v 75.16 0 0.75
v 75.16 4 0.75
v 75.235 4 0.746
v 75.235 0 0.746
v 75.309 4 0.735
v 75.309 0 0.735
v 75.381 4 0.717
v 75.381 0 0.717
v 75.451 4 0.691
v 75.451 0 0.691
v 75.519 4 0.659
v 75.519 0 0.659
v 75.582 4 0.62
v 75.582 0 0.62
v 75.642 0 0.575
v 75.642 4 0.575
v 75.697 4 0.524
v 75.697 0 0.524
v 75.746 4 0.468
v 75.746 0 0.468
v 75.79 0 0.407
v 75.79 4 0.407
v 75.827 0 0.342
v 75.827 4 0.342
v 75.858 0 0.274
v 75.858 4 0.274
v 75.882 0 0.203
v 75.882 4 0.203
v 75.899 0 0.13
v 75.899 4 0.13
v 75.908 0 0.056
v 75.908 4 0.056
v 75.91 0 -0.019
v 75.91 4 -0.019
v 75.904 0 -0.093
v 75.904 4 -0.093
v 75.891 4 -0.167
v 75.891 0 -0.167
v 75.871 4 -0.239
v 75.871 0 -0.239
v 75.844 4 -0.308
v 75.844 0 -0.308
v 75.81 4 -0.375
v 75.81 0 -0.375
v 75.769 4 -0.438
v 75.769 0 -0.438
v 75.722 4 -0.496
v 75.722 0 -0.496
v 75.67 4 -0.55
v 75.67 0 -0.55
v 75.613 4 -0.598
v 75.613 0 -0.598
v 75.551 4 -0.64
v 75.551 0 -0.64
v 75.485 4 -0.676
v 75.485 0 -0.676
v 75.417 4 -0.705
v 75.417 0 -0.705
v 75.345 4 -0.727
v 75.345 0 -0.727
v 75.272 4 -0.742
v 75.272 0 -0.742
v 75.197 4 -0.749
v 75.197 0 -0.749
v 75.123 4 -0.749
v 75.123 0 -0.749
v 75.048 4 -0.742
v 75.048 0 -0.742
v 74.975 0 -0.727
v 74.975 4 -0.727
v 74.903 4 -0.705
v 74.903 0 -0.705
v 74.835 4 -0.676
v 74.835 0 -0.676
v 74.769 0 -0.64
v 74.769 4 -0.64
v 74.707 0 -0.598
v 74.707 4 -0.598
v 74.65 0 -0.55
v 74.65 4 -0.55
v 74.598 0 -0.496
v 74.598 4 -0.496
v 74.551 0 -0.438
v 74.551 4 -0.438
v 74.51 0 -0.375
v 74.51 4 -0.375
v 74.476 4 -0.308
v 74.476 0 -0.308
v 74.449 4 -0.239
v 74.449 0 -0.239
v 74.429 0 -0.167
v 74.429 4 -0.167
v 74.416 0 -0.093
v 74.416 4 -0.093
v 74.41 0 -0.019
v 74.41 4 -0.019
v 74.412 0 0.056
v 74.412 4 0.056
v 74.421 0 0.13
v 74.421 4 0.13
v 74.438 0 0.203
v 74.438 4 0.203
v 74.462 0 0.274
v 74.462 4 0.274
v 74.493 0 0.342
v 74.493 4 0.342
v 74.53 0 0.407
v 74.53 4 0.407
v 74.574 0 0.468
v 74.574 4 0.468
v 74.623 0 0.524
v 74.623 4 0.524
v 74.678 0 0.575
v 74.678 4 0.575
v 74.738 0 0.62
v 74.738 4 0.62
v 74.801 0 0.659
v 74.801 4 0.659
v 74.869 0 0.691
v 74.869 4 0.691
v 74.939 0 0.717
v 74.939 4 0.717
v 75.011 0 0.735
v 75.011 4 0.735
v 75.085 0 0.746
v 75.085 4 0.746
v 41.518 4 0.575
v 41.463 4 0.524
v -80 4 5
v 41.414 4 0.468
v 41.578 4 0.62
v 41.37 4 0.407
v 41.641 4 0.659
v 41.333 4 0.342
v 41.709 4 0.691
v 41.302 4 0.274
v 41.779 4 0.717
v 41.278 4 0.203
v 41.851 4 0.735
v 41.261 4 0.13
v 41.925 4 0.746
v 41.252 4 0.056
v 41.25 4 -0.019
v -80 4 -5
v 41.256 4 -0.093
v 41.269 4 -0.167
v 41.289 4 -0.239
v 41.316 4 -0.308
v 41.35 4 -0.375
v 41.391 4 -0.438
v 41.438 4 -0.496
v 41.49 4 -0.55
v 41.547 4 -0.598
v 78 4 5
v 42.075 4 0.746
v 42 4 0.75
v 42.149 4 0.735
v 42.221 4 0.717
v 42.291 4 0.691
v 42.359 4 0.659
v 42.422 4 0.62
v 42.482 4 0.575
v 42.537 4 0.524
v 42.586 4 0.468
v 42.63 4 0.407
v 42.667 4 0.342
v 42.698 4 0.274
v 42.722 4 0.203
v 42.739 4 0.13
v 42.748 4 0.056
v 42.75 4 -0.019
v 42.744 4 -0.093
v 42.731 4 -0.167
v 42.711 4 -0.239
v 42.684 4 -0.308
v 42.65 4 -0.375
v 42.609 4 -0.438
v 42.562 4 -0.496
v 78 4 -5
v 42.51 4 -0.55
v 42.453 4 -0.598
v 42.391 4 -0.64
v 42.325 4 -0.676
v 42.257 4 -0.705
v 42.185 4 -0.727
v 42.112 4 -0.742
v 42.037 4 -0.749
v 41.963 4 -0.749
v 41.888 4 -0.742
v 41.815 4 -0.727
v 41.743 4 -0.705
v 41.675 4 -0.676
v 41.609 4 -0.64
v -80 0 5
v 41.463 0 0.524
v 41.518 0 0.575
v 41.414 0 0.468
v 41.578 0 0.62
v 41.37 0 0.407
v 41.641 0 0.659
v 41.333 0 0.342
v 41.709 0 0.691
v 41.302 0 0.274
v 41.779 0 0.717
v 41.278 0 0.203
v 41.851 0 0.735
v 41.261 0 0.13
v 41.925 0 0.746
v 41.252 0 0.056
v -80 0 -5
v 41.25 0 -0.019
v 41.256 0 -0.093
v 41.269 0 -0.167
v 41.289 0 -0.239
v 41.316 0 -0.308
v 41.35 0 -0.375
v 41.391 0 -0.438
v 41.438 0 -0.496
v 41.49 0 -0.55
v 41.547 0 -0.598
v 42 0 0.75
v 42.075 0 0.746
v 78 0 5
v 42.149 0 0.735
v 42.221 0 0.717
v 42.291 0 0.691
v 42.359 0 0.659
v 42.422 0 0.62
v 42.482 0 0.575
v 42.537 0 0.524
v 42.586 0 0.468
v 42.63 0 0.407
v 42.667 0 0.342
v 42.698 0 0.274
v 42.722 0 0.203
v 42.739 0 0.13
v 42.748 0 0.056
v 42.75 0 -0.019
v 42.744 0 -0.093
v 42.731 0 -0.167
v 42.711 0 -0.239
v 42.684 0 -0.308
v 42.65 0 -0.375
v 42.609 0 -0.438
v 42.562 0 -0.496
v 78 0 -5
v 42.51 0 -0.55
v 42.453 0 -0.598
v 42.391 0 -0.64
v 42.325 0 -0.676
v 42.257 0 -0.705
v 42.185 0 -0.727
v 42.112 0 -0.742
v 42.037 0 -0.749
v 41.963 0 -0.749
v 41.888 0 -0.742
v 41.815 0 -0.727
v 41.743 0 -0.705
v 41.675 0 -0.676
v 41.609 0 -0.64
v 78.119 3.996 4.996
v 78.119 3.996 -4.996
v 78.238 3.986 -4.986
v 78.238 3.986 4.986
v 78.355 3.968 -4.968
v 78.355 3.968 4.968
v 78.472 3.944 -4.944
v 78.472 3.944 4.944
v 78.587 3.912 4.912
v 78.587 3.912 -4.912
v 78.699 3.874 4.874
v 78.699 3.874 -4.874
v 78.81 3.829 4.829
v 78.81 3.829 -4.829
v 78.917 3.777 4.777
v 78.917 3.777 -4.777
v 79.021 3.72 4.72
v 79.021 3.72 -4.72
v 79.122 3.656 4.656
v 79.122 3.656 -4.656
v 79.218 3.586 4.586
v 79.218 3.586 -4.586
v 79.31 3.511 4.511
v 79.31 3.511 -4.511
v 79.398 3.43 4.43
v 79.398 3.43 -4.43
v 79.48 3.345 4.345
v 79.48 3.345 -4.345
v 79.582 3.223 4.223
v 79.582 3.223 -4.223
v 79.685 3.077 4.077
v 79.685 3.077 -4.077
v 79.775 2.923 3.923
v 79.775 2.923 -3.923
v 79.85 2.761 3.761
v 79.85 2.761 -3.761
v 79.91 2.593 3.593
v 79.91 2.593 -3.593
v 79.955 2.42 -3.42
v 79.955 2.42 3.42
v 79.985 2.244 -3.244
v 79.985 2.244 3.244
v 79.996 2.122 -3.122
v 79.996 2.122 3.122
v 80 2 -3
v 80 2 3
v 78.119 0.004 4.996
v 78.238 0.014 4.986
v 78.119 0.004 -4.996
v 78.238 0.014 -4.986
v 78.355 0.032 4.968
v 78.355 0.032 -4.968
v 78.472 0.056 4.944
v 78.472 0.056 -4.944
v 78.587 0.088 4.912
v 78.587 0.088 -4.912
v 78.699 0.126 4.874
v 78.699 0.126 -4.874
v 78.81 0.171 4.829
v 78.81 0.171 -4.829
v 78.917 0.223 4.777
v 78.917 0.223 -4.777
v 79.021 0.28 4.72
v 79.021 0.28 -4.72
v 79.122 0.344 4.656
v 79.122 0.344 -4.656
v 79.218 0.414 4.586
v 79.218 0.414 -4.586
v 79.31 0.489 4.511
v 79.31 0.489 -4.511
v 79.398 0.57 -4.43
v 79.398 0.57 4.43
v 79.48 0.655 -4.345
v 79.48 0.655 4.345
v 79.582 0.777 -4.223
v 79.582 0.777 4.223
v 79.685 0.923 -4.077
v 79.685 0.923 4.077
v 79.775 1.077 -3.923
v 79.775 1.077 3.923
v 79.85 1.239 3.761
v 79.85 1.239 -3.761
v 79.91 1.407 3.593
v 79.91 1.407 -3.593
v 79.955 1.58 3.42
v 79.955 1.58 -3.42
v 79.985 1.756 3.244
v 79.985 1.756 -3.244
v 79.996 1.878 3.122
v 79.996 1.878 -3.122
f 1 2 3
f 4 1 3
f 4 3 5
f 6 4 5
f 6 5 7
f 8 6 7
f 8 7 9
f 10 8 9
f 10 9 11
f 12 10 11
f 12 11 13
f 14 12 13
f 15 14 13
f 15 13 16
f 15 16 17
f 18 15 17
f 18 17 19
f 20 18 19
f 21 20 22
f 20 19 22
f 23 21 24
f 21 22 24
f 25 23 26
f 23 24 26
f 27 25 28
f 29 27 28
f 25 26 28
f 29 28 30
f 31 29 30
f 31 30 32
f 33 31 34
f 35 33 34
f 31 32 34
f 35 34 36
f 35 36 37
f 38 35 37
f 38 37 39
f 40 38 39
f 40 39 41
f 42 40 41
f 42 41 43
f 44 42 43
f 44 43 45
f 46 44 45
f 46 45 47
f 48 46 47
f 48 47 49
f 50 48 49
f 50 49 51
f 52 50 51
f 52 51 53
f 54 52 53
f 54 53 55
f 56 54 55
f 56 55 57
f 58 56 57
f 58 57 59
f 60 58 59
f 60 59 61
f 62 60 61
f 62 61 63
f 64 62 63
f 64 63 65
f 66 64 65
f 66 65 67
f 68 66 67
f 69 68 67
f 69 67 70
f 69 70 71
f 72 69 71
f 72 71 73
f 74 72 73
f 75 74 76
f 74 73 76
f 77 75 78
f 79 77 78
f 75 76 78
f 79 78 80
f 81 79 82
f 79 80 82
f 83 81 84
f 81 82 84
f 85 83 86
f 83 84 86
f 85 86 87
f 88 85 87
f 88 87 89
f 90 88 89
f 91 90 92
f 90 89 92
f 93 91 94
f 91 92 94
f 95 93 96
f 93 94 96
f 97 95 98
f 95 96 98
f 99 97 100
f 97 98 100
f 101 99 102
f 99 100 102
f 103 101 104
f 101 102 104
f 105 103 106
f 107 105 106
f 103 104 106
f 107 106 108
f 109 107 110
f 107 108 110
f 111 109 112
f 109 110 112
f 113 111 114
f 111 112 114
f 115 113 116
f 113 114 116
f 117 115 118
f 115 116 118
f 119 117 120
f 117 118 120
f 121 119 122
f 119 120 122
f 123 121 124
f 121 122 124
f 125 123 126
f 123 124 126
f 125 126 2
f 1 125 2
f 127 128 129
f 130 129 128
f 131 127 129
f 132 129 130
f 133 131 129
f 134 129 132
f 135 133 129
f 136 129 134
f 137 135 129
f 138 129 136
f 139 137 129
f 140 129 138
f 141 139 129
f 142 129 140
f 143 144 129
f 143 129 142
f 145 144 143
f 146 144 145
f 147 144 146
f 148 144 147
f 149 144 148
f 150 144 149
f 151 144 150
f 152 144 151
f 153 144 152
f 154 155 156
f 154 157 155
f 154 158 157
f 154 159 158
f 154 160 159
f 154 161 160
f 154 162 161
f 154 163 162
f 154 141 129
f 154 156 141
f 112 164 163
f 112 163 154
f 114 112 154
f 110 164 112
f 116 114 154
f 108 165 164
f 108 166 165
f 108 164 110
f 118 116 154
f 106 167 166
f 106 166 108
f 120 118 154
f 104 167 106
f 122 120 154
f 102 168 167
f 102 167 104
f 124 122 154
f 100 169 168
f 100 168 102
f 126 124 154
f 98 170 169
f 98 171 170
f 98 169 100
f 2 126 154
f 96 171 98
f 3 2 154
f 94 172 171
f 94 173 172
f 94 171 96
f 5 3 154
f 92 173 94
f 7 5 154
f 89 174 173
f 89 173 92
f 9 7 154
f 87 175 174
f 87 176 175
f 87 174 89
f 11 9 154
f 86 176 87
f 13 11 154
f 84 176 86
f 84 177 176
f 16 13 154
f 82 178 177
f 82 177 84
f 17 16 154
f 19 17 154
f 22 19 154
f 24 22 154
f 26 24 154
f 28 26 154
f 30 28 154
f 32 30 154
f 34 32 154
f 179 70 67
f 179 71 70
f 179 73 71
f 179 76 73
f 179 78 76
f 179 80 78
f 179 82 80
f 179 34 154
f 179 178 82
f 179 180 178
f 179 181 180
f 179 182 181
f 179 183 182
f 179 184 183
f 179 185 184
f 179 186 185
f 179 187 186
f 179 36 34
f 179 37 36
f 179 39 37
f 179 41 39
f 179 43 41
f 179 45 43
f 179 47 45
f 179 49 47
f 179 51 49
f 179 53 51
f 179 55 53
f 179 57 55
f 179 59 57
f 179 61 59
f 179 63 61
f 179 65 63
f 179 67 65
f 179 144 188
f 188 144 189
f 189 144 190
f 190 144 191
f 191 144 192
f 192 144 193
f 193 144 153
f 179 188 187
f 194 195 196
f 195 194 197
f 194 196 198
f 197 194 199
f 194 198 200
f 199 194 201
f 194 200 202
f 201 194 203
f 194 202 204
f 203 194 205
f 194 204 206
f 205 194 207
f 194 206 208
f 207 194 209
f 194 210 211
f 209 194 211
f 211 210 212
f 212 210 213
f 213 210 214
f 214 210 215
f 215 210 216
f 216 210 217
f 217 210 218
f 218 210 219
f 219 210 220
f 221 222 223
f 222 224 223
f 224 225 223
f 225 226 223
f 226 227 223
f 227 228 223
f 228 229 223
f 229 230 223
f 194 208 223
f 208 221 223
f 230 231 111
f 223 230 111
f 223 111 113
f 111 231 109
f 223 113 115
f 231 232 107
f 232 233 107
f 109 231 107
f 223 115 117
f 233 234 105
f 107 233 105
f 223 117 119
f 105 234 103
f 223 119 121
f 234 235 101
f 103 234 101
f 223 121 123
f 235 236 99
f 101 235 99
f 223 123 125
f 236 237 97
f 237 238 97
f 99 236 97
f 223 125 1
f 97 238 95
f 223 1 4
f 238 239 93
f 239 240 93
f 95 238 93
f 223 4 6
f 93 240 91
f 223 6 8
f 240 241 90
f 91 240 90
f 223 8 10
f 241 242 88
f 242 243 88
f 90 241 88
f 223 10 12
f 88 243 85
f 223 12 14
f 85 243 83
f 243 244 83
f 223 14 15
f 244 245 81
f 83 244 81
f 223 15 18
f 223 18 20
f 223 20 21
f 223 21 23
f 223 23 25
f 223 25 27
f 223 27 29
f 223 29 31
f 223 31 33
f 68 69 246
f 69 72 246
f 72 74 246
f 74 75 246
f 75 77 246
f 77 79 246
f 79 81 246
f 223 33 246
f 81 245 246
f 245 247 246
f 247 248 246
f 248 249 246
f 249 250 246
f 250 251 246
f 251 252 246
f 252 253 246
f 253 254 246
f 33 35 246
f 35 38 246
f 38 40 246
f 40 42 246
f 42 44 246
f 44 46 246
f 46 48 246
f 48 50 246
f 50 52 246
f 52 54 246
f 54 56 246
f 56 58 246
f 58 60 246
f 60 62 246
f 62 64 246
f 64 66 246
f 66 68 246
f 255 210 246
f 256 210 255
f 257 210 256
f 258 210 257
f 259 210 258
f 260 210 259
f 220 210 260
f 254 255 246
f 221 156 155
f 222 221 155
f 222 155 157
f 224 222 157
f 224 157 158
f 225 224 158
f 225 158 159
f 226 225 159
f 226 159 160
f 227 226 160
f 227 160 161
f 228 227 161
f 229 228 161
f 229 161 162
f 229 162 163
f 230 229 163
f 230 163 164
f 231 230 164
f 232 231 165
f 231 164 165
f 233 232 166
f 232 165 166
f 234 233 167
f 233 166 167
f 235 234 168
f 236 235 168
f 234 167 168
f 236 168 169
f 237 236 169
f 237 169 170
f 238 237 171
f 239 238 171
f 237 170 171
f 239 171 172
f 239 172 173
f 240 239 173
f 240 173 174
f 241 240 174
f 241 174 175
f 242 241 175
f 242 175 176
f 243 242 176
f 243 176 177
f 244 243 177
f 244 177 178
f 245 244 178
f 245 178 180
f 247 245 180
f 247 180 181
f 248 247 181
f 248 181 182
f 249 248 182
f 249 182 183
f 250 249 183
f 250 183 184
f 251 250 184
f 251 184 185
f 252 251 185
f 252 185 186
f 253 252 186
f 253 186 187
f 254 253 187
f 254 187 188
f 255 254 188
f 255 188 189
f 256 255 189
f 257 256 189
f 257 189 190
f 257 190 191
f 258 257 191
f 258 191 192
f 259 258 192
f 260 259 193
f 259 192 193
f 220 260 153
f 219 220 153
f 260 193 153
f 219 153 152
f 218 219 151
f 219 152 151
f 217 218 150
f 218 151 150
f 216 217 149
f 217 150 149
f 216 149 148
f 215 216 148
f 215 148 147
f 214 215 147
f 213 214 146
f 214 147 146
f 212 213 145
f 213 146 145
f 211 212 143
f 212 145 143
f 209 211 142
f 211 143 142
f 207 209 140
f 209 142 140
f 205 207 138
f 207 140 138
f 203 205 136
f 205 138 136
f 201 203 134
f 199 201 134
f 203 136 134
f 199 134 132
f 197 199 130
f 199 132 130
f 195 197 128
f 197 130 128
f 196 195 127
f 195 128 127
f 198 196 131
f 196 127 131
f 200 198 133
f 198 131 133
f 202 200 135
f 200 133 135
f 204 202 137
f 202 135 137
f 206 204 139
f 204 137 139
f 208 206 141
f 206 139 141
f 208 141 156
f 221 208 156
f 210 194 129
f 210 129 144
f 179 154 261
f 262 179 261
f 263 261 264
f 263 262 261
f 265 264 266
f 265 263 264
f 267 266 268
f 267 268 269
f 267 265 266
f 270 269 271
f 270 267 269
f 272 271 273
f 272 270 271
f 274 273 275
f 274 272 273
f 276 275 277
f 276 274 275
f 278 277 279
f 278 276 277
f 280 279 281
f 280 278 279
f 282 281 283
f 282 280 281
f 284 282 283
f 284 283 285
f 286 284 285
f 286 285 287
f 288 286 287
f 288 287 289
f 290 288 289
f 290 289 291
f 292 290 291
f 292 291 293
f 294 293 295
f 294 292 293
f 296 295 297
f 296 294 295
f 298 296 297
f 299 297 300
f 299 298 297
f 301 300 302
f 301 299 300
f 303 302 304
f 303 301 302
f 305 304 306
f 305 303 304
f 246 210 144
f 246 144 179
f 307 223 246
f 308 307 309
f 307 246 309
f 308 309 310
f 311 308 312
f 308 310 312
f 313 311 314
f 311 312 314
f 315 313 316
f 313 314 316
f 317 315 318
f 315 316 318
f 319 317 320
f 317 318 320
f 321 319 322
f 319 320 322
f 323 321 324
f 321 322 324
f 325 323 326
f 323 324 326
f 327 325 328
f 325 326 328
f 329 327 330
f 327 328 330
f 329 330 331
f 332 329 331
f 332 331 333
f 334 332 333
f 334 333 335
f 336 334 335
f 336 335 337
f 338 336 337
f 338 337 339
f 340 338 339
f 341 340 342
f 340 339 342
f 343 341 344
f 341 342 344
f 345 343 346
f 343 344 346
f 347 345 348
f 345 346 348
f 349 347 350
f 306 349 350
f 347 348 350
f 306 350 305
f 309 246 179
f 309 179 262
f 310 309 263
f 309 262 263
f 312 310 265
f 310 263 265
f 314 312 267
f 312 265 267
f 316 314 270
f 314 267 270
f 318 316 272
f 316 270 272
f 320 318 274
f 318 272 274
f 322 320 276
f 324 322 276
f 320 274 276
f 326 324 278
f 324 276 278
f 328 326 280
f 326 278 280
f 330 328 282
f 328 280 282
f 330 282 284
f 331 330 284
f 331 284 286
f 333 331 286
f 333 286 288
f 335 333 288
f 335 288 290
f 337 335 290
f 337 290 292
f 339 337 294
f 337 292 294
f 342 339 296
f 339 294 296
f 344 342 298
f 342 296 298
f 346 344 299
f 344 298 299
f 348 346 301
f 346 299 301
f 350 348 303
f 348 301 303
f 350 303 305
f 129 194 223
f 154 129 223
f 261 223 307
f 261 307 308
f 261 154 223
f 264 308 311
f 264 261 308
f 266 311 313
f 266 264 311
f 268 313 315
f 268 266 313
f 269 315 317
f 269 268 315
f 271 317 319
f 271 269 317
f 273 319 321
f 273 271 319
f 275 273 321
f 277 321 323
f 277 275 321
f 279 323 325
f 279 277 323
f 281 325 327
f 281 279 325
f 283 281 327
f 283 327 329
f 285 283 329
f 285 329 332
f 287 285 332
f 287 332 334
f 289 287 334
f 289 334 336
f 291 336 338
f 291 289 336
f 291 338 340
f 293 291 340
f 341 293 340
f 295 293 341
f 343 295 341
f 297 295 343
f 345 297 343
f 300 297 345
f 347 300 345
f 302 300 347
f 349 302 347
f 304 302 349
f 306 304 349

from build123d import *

# Parameters (mm, degrees)
SKETCH_2_W          = 160
SKETCH_2_H          = 10
EXTRUDE_1_DEPTH     = 4
SKETCH_3_R          = 0.75
CUT_EXTRUDE_1_DEPTH = 14
FILLET_1_R          = 2


with BuildPart() as part:
    # Эскиз2 → Бобышка-Вытянуть1 (new body)
    with BuildSketch(Plane(origin=(0, 0, 0), x_dir=(1, 0, 0), z_dir=(0, 1, 0))):
        Rectangle(SKETCH_2_W, SKETCH_2_H)
    extrude(amount=EXTRUDE_1_DEPTH)

    # Эскиз3 → Вырез-Вытянуть1 (cut)
    with BuildSketch(Plane(origin=(0, 4, 0), x_dir=(1, 0, 0), z_dir=(0, 1, 0))):
        with Locations(Location((75.16, 0, 0), (0, 0, 270))):
            Circle(SKETCH_3_R)
        with Locations(Location((42, 0, 0), (0, 0, 270))):
            Circle(SKETCH_3_R)
    extrude(amount=-CUT_EXTRUDE_1_DEPTH, mode=Mode.SUBTRACT)

    # Скругление1
    fillet_1_edges = [part.edges().sort_by_distance(p)[0] for p in [
        (80, 4, 0),
        (80, 0, 0),
        (80, 2, 5),
        (80, 2, -5),
    ]]
    fillet(fillet_1_edges, radius=FILLET_1_R - 0.0001)  # a hair under: the kernel refuses the full size


solid = part.part
